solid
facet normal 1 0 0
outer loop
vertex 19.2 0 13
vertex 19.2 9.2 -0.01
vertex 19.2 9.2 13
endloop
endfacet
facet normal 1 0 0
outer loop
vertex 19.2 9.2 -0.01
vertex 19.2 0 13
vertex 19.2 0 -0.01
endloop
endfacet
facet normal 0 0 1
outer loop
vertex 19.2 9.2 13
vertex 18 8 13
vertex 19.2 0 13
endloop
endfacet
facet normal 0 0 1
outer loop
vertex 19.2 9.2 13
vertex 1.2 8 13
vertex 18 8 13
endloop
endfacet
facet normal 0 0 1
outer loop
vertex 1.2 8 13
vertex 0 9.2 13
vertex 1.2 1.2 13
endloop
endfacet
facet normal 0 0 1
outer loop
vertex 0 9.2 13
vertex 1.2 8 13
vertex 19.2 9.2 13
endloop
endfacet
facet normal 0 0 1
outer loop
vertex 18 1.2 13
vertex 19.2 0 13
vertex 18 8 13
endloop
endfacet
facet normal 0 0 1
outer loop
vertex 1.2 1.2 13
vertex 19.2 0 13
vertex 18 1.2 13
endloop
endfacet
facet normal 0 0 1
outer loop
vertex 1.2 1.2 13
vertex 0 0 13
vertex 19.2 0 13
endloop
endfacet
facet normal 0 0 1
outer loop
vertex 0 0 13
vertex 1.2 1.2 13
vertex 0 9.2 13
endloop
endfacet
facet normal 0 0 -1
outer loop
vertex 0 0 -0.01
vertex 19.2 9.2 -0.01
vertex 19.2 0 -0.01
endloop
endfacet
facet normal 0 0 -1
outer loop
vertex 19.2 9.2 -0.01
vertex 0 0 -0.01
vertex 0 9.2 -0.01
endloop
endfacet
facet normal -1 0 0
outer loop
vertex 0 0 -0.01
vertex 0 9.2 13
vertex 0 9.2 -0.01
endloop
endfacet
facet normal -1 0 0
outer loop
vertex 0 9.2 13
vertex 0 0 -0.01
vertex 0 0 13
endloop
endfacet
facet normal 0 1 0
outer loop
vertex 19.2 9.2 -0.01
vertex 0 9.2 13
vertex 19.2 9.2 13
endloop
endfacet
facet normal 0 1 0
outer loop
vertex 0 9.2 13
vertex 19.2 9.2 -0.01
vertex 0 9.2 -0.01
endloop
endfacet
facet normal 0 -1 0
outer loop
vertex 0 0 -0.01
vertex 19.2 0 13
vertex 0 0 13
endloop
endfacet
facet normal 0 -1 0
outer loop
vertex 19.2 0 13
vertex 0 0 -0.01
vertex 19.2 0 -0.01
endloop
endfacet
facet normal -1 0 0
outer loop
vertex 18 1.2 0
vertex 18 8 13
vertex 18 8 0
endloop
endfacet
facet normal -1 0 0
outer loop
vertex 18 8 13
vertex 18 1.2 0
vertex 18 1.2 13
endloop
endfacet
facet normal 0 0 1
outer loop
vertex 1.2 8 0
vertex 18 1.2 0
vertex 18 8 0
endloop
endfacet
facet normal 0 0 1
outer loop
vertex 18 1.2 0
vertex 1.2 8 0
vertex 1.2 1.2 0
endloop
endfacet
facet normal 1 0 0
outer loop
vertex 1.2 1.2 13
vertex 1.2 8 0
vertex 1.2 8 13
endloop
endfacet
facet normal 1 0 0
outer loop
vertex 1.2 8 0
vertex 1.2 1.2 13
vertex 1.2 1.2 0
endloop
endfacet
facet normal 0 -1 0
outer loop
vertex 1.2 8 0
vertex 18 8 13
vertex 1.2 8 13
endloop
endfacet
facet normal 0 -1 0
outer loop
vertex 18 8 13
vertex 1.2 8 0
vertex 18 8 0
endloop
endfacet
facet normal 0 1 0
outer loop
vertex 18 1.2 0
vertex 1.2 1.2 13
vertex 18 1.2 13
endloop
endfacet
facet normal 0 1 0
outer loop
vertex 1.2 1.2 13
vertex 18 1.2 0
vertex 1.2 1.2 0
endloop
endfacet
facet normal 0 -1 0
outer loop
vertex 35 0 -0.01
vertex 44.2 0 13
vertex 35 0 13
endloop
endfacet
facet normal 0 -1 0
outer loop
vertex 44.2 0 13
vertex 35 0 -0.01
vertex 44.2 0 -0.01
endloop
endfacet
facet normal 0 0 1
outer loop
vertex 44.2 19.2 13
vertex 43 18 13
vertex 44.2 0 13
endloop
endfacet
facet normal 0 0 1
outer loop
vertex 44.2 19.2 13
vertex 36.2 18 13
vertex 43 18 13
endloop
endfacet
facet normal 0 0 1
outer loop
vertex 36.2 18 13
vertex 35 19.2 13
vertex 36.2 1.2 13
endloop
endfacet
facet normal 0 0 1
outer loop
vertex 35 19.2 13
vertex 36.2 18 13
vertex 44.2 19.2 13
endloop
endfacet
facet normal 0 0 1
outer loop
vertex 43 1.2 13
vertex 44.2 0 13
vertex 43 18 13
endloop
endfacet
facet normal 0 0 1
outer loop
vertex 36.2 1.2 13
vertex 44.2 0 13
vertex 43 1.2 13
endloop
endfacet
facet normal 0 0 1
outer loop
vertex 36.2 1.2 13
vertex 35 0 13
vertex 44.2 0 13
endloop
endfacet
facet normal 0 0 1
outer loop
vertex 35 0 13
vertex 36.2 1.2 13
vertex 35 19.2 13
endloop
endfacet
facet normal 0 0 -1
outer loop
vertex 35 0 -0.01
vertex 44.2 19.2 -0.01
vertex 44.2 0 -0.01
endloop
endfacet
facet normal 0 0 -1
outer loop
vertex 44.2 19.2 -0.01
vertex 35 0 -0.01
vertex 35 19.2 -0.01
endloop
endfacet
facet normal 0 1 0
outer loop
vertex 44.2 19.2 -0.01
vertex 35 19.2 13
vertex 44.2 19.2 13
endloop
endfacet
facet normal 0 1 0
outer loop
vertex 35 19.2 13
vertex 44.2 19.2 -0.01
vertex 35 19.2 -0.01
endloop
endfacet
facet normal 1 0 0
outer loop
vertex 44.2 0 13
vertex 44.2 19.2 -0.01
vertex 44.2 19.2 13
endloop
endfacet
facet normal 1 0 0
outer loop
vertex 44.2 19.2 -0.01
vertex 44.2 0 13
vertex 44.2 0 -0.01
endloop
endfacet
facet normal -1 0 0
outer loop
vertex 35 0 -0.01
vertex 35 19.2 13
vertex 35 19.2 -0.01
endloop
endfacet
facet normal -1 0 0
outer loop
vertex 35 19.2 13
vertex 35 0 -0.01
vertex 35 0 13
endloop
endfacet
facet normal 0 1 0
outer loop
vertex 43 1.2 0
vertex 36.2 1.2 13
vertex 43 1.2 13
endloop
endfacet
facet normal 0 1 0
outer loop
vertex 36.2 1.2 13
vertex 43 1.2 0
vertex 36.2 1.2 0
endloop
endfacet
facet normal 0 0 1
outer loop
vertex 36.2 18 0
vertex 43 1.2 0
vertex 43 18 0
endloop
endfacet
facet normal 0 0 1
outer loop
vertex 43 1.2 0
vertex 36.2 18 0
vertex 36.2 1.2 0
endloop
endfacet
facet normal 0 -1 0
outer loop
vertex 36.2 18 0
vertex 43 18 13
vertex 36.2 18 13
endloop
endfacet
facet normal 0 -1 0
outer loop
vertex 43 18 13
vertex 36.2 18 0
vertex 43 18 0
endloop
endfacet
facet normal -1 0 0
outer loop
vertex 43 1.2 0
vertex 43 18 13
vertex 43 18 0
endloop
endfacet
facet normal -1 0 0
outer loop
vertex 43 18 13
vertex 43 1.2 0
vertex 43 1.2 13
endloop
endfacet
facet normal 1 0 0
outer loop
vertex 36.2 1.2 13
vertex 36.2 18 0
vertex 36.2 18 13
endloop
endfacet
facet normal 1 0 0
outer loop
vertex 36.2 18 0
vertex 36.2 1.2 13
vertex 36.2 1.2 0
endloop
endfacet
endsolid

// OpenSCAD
// file: ../../Base/Boxes.scad
// Fischertechnik Box Foundation
// Pre-designed Boxes

use <Constants.scad>

include <PlacementOptions.scad>

box190Width = 190;
box190Depth = 130;
box130Width = 130;
box130Depth = 95;
boxUsageHeight = 33.9;
boxWallThickness = 2.4;
boxBaseThickness = 1.0;

// getBoxWallThickness()
// Gets the wall thickness of a Fischertechnik Box

function getBoxWallThickness() = boxWallThickness;

// Gets the usable height of a fischertechnik box
function getBoxUsageHeight() = boxUsageHeight;

// Gets the thickness of the Fischertechnik box base.
function getBoxBaseThickness() = boxBaseThickness;

// Gets the usable inner space of a Box 190 as an x/y-list
function getBox190Space() = [
    box190Width - 2*getBoxWallThickness(), 
    box190Depth - 2*getBoxWallThickness() ];

// Imports the Fischertechnik empty box 130x190 mm and places it at position 0,0
// 190x130 are the outer sizes, the inner space is slightly smaller. Use getBox190Space() to get the inner sizes.
// This module needs the STL file "Fischertechnik Box 130x190.stl" in the library path.
// The box is positioned that the usable inner space is at the 0,0,0 position. The

module Box190() {
    translate([-getBoxWallThickness(),-getBoxWallThickness(),-getBoxBaseThickness()])
        import("Fischertechnik Box 130x190.stl", convexity=3);
}

// Gets the usable inner space of a Box 130 as an x/y-list
function getBox130Space() = [
    box130Width - 2*getBoxWallThickness(), 
    box130Depth - 2*getBoxWallThickness() ];

// Imports the Fischertechnik empty box 95x130 mm and places it at position 0,0
// 190x130 are the outer sizes, the inner space is slightly smaller. Use getBox190Space() to get the inner sizes.
// This module needs the STL file "Fischertechnik Box 95x130.stl" in the library path.
// The box is positioned that the usable inner space is at the 0,0,0 position. The

module Box130() {
    translate([-getBoxWallThickness(),-getBoxWallThickness(),-getBoxBaseThickness()])
        import("Fischertechnik Box 95x130.stl", convexity=3);
}

// Creates a web at the specified box walls
// corner 0 = LowerLeft, 1 = UpperLeft, 2 = UpperRight, 3 = LowerRight
// side 0 = LeftOfCorner, 1 = RightOfCorner
// distance = Distance in mm from the corner
// box = inner width and depth of the box (default: Box 190)
// webWidth = length of the web (default is 3 mms)
// webThickness = thickness of the web (default is 1 mm)

module BoxWeb(corner, side, distance, box=getBox190Space(), webWidth=3, webThickness=1.0) {
    sink = getBoxWallThickness()/2;

    width = (corner % 2 == 0) ? 
            (side == LeftOfCorner ? webWidth : webThickness) :
            (side == LeftOfCorner ? webThickness : webWidth);

    depth = (corner % 2 == 0) ? 
            (side == RightOfCorner ? webWidth : webThickness) :
            (side == RightOfCorner ? webThickness : webWidth);
    
    xDiff = corner == LowerLeft ? 
                (side == LeftOfCorner ? -sink : distance) :
            (corner == UpperLeft ?                
                (side == LeftOfCorner ? distance : -sink) :
            (corner == UpperRight ?
                (side == LeftOfCorner ? box.x-webWidth+sink : box.x-distance-webThickness) :
                (side == LeftOfCorner ? box.x-distance-webThickness: box.x-webWidth+sink)));

    yDiff = corner == LowerLeft ? 
                (side == RightOfCorner ? -sink : distance) :
            (corner == UpperLeft ?
                (side == RightOfCorner ? box.y-distance : box.y-webWidth+sink) :
            (corner == UpperRight ?
                (side == RightOfCorner ? box.y-webWidth+sink : box.y-distance) :
                (side == RightOfCorner ? distance : -sink)));
    
    translate([xDiff, yDiff, -getExcess()])
        cube([width, depth, boxUsageHeight + 2*getExcess()]);
}
// file: ../../Base/Rotation.scad
// Fischertechnik Box Foundation
// Geometry Helpers Rotation

include <PlacementOptions.scad>

// getRotatedSpace(space, rotation=NoRotation)
// Rotates the space dependent on the specified rotation

function getRotatedSpace(space, rotation=NoRotation) = [
    (rotation == Rotate90 || rotation == Rotate270) ? space.y : space.x,
    (rotation == Rotate90 || rotation == Rotate270) ? space.x : space.y
];

// Rotates the given space around the fixed left lower corner
// space = the space the children needs as width/depth list [width,depth]
// rotation = 0 Rotate0 degrees, 1 Rotate90 degrees, 2 Rotate180 degrees, 3 Rotate270 degrees (equivalent to -90)

module RotateFix(space, rotation=Rotate0) {
    dy = (rotation == Rotate0 || rotation == Rotate270) ? 0 :
        (rotation == Rotate90) ? space.x :
        space.y;
    dx = (rotation < Rotate180) ? 0 :
        (rotation == Rotate180) ? space.x :
        space.y;
    
    translate([dx, dy, 0])
        rotate([0, 0, rotations[rotation]])
            children();
}
// file: ../../Base/Alignment.scad
// Fischertechnik Box Foundation
// Geometry Helpers Alignment

include <PlacementOptions.scad>

// getAlignedX(elementWidth, spaceWidth, align=AlignRight, offset=0)
// Gets the aligned X offset of an element with the given
// width in the given space.
// elementWidth = The width of the element to positon
// spaceWidth = The space where the element should be aligned
// align = 0 AlignLeft, 1 AlignCenter, 2 AlignRight
// offset = an optional offset from the aligned position. When
// aligned left or centered, then positive values are in X direction.
// When aligned right then positive values are in negative X direction.

function getAlignedX(elementWidth, spaceWidth, align=AlignRight, offset=0) =
    (align == AlignLeft) ?
        offset :
        ((align == AlignCenter) ?
        (spaceWidth - elementWidth)/2 + offset :
        spaceWidth - offset - elementWidth);

// getAlignedY(elementDepth, spaceDepth, align=AlignTop, offset=0)
// Gets the aligned Y offset of an element with the given
// depth in the given space.
// elementDepth = The depth of the element to positon
// spaceDepth = The space where the element should be aligned
// align = 0 AlignBottom, 1 AlignCenter, 2 AlignTop
// offset = an optional offset from the aligned position. When
// aligned bottom or centered, then positive values are in Y direction.
// When aligned top then positive values are in negative Y direction.

function getAlignedY(elementDepth, spaceDepth, align=AlignTop, offset=0) =
    (align == AlignBottom) ?
        offset :
        ((align == AlignCenter) ?
        (spaceDepth - elementDepth)/2 + offset :
        spaceDepth - offset - elementDepth);
// file: ../../Base/Constants.scad
// Fischertechnik Box Foundation
// Constants

// Constant values necessary for multiple elements

// Base constants
dividerThickness = 1.2;
excess = 0.01;
fragments = 90;
tolerance = 0.8;

// Gets the thickness of a divider 
function getDividerThickness() = dividerThickness;

// Gets the excess that is used to merge walls into each other
function getExcess() = excess;

// Gets amount of fragments of a cylinder
function getFragments() = fragments;

// Gets the inner tolerance of a frame to each side
function getTolerance() = tolerance;


// Fischertechnik specific constants
axisDiameter = 4;
axisBottomDiameter = axisDiameter + 1;
standardEdgeDistance = 2.5;
standardWebDistance = 11.5;
standardCornerLength = 15;
tubeWallFactor = 1.6;

// Gets axis diameter
function getAxisDiameter() = axisDiameter;

// Gets axis bottom diameter for thicker part at the bottom
function getAxisBottomDiameter() = axisBottomDiameter;

// gets the standard distance to the wall of the box for dockable frames with webs
function getStandardEdgeDistance() = standardEdgeDistance;

// gets the standard distance of each web to the corner of the dockable frame
function getStandardWebDistance() = standardWebDistance;

// gets the standard length of the corner walls of a dockable frame
function getStandardCornerLength() = standardCornerLength;

// gets the wall thickness of a tube.
function getTubeWallThickness() = tubeWallFactor * getDividerThickness();
// file: ../../Base/PlacementOptions.scad
// Fischertechnik Box Foundation
// Placement Options

// Alignment
NoAlign = 0;
AlignLeft = 1;
AlignBottom = 2;
AlignCenter = 3;
AlignRight = 4;
AlignTop = 5;

// Element rotation degree steps
rotations = [0, -90, -180, -270];

// Rotation
NoRotation = 0;
Rotate0 = 0;
Rotate90 = 1;
Rotate180 = 2;
Rotate270 = 3;

// Docking (seen from above)
NoDock = -1;
DockLeft = 0;
DockTop = 1;
DockRight = 2;
DockCorner = 2;
DockBottom = 3;

// Web corners
LowerLeft = 0;
UpperLeft = 1;
UpperRight = 2;
LowerRight = 3;

// Web position relative to corner
LeftOfCorner = 0;
RightOfCorner = 1;
// file: ../../Elements/FramePluggedResistor.scad
// Fischertechnik Box Library
// Frame for Plugged Resistor (two plugs)
// 36381

use <../ModelBase/Simple.scad>

width = 16;
depth = 6;
height = 13;

// getFramePluggedResistorSpace()
// Gets the space the frame for a plugged capacitor needs as width and depth (.x and .y as a list)

function getFramePluggedResistorSpace() = getFrameOuterVolume([width, depth, height]);

// FramePluggedResistor()
// The walls of the frame are 13 mm high. 
// The complete frame has a tolerance of addition 1 mm in each direction.

module FramePluggedResistor() {
    Frame([width, depth, height]);
}

// Tests
color("lightgray") {
FramePluggedResistor();
}
// file: ../../Base/Placement.scad
// Fischertechnik Box Foundation
// Geometry Helpers Placement

use <Constants.scad>
use <Alignment.scad>
use <Rotation.scad>
use <Boxes.scad>

include <PlacementOptions.scad>

// Place(x=0, y=0, elementSpace=[0,0], alignX=AlignLeft, alignY=AlignBottom, rotation=Rotate0, boxSpace=getBox190Space())
// Places the child at the specified position
// y = Y-Position. This is a relative position when an X aligment is specified.
// x = X-Position. This is a relative position when an Y aligment is specified.
// elementSpace = space of the element to be placed [x,y]
// alignX = -1=NoAlign, 0 AlignLeft, 1 AlignCenter, 3 AlignRight (elementSpace and boxSpace required!)
// alignY = -1=NoAlign, 2 AlignBottom, 1 AlignCenter, 4 AlignTop (elementSpace and boxSpace required!)
// rotation = 0 Rotate0 0 degrees, 1 Rotate90 90 degrees, 
// 2 Rotate180 180 degrees, 3 Rotate270 270 degrees (equivalent to -90)
// boxSpace = Inner space of the box where the placement occurs [x,y] - default is Box 190x130 inner space

module Place(x=0, y=0, elementSpace=[0,0], 
  alignX=AlignLeft, alignY=AlignBottom, 
  rotation=NoRotation, boxSpace=getBox190Space()) {

    module Position(x, y, space, rotation=Rotate0) {
        translate([x, y, 0])
            RotateFix(space, rotation)
                children(0);
    }

    space = getRotatedSpace(elementSpace, rotation);
    alignedX = getAlignedX(space.x, boxSpace.x, alignX, x);
    alignedY = getAlignedY(space.y, boxSpace.y, alignY, y);
    Position(alignedX, alignedY, elementSpace, rotation)
        children(0);
}

// Center(space=getBox130Space(), elementSpace=[0,0])
// space = Space where the children is centered. For cylinder use centered=true and no elementSpace.
// elementSpace = space of the element to be centered [x,y]

module Center(space=getBox190Space(), elementSpace=[0,0]) {
    translate([(space.x - elementSpace.x) / 2, (space.y - elementSpace.y) / 2])
        children(0);
}

// CenterHorizontal(width=0, y=0, offset=0, space=getBox130Space())
// space = Space where the children is centered. For cylinder use centered=true and no elementSpace.
// elementSpace = space of the element to be centered [x,y]

module CenterHorizontal(width=0, y=0, offset=0, space=getBox190Space()) {
    translate([(space.x - width) / 2 + offset, y])
        children(0);
}

// CenterVertical(depth=0, x=0, offset=0, space=getBox130Space())
// space = Space where the children is centered. For cylinder use centered=true and no elementSpace.
// elementSpace = space of the element to be centered [x,y]

module CenterVerticalal(depth=0, x=0, offset=0, space=getBox190Space()) {
    translate([x, (space.y - depth) / 2 + offset])
        children(0);
}
// main file
// Fischertechnik Box Foundation
// Elements
// Test FramePluggedResistor

use <../../Base/Placement.scad>
use <../../Elements/FramePluggedResistor.scad>

include <../../Base/PlacementOptions.scad>

FramePluggedResistor();

Place(35, 0, getFramePluggedResistorSpace(), rotation=Rotate90)
    FramePluggedResistor();
